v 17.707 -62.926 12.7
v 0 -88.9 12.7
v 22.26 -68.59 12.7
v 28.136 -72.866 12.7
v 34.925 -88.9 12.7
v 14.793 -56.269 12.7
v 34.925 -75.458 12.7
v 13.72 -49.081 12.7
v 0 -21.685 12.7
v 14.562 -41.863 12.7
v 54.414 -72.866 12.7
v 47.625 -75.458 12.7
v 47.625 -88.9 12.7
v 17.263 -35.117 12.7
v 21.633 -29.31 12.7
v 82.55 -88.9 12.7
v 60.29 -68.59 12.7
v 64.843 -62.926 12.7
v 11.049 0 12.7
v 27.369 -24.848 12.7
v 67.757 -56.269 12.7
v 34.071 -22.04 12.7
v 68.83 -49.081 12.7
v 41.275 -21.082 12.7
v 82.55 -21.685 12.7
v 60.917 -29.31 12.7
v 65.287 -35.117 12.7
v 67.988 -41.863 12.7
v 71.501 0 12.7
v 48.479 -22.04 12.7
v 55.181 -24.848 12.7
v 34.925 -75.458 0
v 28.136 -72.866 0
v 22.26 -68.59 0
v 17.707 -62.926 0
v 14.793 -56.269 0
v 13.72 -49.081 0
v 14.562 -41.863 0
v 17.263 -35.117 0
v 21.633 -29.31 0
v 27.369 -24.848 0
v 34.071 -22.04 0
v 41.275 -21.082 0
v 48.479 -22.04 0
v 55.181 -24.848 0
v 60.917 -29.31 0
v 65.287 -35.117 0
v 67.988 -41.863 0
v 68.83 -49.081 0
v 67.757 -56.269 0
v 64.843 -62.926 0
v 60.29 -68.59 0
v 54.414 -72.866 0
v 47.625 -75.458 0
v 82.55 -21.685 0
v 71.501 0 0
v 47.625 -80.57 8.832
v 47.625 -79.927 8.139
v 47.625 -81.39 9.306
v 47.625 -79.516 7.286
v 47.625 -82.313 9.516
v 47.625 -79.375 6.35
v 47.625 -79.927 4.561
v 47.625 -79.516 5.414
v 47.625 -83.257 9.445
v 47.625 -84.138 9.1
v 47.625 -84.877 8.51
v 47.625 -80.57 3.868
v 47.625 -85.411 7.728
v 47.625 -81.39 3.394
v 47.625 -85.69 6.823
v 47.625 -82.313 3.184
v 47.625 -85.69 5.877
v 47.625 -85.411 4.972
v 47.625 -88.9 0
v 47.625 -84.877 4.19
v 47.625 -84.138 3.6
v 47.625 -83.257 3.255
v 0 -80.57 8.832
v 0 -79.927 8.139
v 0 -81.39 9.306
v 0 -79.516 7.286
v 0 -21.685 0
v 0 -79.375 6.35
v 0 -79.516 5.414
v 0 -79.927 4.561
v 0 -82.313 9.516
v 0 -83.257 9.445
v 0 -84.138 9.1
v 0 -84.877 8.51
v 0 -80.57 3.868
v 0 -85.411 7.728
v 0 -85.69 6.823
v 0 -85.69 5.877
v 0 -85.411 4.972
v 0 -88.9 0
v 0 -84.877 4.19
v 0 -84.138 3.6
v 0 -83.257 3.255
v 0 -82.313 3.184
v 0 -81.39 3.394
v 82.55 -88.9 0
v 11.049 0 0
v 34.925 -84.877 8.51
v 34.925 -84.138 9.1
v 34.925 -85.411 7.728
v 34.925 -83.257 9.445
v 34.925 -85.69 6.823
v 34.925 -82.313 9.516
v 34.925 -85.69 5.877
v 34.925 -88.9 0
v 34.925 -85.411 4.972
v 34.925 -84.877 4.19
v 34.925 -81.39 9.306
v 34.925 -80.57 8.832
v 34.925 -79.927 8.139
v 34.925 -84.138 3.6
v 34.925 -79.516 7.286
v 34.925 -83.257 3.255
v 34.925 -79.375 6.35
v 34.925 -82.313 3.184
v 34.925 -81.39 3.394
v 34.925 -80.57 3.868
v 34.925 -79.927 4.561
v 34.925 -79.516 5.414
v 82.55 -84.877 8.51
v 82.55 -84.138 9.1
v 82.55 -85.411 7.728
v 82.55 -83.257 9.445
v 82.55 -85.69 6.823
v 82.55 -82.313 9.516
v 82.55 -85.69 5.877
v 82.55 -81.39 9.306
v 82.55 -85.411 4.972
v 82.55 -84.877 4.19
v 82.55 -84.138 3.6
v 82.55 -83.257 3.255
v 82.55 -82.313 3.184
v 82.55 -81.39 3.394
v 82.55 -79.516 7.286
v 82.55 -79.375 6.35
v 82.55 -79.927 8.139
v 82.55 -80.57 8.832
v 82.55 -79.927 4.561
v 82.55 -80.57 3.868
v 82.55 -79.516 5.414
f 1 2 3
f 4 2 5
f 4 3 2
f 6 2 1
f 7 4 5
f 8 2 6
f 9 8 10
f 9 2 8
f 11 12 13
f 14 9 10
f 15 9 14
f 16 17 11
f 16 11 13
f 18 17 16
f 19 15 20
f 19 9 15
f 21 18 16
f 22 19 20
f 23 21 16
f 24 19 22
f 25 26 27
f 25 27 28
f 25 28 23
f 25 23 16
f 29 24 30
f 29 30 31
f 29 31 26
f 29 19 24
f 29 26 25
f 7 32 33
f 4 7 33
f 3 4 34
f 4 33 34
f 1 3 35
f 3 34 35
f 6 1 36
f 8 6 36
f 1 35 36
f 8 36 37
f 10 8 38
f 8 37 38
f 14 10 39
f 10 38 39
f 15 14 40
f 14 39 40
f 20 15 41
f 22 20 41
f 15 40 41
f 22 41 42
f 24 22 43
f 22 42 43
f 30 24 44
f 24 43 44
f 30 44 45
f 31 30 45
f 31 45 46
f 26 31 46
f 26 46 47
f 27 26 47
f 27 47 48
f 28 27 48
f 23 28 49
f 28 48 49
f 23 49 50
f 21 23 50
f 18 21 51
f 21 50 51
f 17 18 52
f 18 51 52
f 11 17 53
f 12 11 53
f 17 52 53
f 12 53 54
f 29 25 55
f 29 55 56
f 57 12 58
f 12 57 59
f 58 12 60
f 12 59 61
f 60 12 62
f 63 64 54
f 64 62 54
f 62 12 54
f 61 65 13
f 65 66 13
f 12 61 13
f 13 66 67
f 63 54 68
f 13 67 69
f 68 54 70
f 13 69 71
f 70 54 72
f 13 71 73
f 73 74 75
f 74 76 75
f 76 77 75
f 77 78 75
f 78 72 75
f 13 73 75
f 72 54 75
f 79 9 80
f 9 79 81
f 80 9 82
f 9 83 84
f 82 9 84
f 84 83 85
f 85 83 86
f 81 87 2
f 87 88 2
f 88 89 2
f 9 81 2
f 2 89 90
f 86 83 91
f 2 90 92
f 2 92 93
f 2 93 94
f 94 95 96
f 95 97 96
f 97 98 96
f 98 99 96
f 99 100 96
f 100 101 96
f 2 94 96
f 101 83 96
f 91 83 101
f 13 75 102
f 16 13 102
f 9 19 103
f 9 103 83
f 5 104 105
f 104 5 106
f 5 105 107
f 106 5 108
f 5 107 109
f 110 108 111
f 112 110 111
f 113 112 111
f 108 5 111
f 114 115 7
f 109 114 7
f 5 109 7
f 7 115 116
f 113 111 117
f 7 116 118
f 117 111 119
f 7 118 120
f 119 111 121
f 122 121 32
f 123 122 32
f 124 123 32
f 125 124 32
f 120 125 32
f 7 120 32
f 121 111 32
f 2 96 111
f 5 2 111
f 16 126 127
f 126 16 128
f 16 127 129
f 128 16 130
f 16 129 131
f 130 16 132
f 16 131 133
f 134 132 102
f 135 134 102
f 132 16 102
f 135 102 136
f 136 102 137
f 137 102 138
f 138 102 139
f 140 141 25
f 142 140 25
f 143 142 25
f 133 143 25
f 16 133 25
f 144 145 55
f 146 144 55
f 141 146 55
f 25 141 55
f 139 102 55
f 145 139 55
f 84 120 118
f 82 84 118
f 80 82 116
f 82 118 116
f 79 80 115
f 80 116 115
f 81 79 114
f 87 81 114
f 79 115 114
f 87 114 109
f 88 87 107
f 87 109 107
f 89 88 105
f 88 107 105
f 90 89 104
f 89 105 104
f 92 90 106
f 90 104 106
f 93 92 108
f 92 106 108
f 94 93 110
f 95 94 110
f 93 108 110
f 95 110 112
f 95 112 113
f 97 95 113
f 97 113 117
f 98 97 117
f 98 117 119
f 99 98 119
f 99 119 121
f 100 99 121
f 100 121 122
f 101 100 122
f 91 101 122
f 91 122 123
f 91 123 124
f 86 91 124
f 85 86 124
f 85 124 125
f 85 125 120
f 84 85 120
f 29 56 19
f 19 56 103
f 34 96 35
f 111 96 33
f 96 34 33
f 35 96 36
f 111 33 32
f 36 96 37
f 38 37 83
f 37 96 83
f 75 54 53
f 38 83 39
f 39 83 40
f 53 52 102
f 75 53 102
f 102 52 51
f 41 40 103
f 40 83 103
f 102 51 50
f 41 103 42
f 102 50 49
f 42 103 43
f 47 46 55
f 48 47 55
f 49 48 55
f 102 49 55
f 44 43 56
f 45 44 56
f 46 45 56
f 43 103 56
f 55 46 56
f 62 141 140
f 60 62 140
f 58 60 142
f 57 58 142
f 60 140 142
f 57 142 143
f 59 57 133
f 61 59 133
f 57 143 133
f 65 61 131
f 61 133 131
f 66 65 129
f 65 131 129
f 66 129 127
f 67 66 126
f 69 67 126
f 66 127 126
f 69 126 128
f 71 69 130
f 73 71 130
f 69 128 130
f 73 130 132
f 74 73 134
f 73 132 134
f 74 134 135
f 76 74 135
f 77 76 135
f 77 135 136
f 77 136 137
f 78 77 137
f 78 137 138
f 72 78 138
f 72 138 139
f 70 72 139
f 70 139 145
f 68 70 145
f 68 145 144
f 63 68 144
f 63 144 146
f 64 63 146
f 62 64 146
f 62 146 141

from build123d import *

# Parameters (mm, degrees)
BOSS_EXTRU_1_DEPTH      = 12.7
ESQUISSE2_R             = 3.175
ENL_V_MAT_EXTRU_1_DEPTH = 122.979516723
ENL_V_MAT_EXTRU_2_DEPTH = 122.979516723


with BuildPart() as part:
    # Esquisse1 → Boss.-Extru.1 (new body)
    with BuildSketch(Plane.XY):
        with BuildLine():
            Line((34.925, -88.9), (34.925, -75.458456647))
            ThreePointArc((34.925, -75.458456647), (41.275, -21.082), (47.625, -75.458456647))
            Line((47.625, -75.458456647), (47.625, -88.9))
            Line((47.625, -88.9), (82.55, -88.9))
            Line((82.55, -88.9), (82.55, 0))
            Line((82.55, 0), (0, 0))
            Line((0, 0), (0, -88.9))
            Line((0, -88.9), (34.925, -88.9))
        make_face()
    extrude(amount=BOSS_EXTRU_1_DEPTH)

    # Esquisse2 → Enlèv. mat.-Extru.1 (cut, through all)
    with BuildSketch(Plane(origin=(82.55, 0, 0), x_dir=(0, 0, -1), z_dir=(1, 0, 0))):
        with Locations(Location((-6.35, -82.55, 0), (0, 0, 90))):
            Circle(ESQUISSE2_R)
    extrude(amount=-ENL_V_MAT_EXTRU_1_DEPTH, mode=Mode.SUBTRACT)

    # Esquisse3 → Enlèv. mat.-Extru.2 (cut, through all)
    with BuildSketch(Plane.XY.offset(12.7)):
        Polygon((11.049, 0), (0, -21.684883475), (0, 0), align=None)
        Polygon((71.501, 0), (82.55, 0), (82.55, -21.684883475), align=None)
    extrude(amount=-ENL_V_MAT_EXTRU_2_DEPTH, mode=Mode.SUBTRACT)


solid = part.part
